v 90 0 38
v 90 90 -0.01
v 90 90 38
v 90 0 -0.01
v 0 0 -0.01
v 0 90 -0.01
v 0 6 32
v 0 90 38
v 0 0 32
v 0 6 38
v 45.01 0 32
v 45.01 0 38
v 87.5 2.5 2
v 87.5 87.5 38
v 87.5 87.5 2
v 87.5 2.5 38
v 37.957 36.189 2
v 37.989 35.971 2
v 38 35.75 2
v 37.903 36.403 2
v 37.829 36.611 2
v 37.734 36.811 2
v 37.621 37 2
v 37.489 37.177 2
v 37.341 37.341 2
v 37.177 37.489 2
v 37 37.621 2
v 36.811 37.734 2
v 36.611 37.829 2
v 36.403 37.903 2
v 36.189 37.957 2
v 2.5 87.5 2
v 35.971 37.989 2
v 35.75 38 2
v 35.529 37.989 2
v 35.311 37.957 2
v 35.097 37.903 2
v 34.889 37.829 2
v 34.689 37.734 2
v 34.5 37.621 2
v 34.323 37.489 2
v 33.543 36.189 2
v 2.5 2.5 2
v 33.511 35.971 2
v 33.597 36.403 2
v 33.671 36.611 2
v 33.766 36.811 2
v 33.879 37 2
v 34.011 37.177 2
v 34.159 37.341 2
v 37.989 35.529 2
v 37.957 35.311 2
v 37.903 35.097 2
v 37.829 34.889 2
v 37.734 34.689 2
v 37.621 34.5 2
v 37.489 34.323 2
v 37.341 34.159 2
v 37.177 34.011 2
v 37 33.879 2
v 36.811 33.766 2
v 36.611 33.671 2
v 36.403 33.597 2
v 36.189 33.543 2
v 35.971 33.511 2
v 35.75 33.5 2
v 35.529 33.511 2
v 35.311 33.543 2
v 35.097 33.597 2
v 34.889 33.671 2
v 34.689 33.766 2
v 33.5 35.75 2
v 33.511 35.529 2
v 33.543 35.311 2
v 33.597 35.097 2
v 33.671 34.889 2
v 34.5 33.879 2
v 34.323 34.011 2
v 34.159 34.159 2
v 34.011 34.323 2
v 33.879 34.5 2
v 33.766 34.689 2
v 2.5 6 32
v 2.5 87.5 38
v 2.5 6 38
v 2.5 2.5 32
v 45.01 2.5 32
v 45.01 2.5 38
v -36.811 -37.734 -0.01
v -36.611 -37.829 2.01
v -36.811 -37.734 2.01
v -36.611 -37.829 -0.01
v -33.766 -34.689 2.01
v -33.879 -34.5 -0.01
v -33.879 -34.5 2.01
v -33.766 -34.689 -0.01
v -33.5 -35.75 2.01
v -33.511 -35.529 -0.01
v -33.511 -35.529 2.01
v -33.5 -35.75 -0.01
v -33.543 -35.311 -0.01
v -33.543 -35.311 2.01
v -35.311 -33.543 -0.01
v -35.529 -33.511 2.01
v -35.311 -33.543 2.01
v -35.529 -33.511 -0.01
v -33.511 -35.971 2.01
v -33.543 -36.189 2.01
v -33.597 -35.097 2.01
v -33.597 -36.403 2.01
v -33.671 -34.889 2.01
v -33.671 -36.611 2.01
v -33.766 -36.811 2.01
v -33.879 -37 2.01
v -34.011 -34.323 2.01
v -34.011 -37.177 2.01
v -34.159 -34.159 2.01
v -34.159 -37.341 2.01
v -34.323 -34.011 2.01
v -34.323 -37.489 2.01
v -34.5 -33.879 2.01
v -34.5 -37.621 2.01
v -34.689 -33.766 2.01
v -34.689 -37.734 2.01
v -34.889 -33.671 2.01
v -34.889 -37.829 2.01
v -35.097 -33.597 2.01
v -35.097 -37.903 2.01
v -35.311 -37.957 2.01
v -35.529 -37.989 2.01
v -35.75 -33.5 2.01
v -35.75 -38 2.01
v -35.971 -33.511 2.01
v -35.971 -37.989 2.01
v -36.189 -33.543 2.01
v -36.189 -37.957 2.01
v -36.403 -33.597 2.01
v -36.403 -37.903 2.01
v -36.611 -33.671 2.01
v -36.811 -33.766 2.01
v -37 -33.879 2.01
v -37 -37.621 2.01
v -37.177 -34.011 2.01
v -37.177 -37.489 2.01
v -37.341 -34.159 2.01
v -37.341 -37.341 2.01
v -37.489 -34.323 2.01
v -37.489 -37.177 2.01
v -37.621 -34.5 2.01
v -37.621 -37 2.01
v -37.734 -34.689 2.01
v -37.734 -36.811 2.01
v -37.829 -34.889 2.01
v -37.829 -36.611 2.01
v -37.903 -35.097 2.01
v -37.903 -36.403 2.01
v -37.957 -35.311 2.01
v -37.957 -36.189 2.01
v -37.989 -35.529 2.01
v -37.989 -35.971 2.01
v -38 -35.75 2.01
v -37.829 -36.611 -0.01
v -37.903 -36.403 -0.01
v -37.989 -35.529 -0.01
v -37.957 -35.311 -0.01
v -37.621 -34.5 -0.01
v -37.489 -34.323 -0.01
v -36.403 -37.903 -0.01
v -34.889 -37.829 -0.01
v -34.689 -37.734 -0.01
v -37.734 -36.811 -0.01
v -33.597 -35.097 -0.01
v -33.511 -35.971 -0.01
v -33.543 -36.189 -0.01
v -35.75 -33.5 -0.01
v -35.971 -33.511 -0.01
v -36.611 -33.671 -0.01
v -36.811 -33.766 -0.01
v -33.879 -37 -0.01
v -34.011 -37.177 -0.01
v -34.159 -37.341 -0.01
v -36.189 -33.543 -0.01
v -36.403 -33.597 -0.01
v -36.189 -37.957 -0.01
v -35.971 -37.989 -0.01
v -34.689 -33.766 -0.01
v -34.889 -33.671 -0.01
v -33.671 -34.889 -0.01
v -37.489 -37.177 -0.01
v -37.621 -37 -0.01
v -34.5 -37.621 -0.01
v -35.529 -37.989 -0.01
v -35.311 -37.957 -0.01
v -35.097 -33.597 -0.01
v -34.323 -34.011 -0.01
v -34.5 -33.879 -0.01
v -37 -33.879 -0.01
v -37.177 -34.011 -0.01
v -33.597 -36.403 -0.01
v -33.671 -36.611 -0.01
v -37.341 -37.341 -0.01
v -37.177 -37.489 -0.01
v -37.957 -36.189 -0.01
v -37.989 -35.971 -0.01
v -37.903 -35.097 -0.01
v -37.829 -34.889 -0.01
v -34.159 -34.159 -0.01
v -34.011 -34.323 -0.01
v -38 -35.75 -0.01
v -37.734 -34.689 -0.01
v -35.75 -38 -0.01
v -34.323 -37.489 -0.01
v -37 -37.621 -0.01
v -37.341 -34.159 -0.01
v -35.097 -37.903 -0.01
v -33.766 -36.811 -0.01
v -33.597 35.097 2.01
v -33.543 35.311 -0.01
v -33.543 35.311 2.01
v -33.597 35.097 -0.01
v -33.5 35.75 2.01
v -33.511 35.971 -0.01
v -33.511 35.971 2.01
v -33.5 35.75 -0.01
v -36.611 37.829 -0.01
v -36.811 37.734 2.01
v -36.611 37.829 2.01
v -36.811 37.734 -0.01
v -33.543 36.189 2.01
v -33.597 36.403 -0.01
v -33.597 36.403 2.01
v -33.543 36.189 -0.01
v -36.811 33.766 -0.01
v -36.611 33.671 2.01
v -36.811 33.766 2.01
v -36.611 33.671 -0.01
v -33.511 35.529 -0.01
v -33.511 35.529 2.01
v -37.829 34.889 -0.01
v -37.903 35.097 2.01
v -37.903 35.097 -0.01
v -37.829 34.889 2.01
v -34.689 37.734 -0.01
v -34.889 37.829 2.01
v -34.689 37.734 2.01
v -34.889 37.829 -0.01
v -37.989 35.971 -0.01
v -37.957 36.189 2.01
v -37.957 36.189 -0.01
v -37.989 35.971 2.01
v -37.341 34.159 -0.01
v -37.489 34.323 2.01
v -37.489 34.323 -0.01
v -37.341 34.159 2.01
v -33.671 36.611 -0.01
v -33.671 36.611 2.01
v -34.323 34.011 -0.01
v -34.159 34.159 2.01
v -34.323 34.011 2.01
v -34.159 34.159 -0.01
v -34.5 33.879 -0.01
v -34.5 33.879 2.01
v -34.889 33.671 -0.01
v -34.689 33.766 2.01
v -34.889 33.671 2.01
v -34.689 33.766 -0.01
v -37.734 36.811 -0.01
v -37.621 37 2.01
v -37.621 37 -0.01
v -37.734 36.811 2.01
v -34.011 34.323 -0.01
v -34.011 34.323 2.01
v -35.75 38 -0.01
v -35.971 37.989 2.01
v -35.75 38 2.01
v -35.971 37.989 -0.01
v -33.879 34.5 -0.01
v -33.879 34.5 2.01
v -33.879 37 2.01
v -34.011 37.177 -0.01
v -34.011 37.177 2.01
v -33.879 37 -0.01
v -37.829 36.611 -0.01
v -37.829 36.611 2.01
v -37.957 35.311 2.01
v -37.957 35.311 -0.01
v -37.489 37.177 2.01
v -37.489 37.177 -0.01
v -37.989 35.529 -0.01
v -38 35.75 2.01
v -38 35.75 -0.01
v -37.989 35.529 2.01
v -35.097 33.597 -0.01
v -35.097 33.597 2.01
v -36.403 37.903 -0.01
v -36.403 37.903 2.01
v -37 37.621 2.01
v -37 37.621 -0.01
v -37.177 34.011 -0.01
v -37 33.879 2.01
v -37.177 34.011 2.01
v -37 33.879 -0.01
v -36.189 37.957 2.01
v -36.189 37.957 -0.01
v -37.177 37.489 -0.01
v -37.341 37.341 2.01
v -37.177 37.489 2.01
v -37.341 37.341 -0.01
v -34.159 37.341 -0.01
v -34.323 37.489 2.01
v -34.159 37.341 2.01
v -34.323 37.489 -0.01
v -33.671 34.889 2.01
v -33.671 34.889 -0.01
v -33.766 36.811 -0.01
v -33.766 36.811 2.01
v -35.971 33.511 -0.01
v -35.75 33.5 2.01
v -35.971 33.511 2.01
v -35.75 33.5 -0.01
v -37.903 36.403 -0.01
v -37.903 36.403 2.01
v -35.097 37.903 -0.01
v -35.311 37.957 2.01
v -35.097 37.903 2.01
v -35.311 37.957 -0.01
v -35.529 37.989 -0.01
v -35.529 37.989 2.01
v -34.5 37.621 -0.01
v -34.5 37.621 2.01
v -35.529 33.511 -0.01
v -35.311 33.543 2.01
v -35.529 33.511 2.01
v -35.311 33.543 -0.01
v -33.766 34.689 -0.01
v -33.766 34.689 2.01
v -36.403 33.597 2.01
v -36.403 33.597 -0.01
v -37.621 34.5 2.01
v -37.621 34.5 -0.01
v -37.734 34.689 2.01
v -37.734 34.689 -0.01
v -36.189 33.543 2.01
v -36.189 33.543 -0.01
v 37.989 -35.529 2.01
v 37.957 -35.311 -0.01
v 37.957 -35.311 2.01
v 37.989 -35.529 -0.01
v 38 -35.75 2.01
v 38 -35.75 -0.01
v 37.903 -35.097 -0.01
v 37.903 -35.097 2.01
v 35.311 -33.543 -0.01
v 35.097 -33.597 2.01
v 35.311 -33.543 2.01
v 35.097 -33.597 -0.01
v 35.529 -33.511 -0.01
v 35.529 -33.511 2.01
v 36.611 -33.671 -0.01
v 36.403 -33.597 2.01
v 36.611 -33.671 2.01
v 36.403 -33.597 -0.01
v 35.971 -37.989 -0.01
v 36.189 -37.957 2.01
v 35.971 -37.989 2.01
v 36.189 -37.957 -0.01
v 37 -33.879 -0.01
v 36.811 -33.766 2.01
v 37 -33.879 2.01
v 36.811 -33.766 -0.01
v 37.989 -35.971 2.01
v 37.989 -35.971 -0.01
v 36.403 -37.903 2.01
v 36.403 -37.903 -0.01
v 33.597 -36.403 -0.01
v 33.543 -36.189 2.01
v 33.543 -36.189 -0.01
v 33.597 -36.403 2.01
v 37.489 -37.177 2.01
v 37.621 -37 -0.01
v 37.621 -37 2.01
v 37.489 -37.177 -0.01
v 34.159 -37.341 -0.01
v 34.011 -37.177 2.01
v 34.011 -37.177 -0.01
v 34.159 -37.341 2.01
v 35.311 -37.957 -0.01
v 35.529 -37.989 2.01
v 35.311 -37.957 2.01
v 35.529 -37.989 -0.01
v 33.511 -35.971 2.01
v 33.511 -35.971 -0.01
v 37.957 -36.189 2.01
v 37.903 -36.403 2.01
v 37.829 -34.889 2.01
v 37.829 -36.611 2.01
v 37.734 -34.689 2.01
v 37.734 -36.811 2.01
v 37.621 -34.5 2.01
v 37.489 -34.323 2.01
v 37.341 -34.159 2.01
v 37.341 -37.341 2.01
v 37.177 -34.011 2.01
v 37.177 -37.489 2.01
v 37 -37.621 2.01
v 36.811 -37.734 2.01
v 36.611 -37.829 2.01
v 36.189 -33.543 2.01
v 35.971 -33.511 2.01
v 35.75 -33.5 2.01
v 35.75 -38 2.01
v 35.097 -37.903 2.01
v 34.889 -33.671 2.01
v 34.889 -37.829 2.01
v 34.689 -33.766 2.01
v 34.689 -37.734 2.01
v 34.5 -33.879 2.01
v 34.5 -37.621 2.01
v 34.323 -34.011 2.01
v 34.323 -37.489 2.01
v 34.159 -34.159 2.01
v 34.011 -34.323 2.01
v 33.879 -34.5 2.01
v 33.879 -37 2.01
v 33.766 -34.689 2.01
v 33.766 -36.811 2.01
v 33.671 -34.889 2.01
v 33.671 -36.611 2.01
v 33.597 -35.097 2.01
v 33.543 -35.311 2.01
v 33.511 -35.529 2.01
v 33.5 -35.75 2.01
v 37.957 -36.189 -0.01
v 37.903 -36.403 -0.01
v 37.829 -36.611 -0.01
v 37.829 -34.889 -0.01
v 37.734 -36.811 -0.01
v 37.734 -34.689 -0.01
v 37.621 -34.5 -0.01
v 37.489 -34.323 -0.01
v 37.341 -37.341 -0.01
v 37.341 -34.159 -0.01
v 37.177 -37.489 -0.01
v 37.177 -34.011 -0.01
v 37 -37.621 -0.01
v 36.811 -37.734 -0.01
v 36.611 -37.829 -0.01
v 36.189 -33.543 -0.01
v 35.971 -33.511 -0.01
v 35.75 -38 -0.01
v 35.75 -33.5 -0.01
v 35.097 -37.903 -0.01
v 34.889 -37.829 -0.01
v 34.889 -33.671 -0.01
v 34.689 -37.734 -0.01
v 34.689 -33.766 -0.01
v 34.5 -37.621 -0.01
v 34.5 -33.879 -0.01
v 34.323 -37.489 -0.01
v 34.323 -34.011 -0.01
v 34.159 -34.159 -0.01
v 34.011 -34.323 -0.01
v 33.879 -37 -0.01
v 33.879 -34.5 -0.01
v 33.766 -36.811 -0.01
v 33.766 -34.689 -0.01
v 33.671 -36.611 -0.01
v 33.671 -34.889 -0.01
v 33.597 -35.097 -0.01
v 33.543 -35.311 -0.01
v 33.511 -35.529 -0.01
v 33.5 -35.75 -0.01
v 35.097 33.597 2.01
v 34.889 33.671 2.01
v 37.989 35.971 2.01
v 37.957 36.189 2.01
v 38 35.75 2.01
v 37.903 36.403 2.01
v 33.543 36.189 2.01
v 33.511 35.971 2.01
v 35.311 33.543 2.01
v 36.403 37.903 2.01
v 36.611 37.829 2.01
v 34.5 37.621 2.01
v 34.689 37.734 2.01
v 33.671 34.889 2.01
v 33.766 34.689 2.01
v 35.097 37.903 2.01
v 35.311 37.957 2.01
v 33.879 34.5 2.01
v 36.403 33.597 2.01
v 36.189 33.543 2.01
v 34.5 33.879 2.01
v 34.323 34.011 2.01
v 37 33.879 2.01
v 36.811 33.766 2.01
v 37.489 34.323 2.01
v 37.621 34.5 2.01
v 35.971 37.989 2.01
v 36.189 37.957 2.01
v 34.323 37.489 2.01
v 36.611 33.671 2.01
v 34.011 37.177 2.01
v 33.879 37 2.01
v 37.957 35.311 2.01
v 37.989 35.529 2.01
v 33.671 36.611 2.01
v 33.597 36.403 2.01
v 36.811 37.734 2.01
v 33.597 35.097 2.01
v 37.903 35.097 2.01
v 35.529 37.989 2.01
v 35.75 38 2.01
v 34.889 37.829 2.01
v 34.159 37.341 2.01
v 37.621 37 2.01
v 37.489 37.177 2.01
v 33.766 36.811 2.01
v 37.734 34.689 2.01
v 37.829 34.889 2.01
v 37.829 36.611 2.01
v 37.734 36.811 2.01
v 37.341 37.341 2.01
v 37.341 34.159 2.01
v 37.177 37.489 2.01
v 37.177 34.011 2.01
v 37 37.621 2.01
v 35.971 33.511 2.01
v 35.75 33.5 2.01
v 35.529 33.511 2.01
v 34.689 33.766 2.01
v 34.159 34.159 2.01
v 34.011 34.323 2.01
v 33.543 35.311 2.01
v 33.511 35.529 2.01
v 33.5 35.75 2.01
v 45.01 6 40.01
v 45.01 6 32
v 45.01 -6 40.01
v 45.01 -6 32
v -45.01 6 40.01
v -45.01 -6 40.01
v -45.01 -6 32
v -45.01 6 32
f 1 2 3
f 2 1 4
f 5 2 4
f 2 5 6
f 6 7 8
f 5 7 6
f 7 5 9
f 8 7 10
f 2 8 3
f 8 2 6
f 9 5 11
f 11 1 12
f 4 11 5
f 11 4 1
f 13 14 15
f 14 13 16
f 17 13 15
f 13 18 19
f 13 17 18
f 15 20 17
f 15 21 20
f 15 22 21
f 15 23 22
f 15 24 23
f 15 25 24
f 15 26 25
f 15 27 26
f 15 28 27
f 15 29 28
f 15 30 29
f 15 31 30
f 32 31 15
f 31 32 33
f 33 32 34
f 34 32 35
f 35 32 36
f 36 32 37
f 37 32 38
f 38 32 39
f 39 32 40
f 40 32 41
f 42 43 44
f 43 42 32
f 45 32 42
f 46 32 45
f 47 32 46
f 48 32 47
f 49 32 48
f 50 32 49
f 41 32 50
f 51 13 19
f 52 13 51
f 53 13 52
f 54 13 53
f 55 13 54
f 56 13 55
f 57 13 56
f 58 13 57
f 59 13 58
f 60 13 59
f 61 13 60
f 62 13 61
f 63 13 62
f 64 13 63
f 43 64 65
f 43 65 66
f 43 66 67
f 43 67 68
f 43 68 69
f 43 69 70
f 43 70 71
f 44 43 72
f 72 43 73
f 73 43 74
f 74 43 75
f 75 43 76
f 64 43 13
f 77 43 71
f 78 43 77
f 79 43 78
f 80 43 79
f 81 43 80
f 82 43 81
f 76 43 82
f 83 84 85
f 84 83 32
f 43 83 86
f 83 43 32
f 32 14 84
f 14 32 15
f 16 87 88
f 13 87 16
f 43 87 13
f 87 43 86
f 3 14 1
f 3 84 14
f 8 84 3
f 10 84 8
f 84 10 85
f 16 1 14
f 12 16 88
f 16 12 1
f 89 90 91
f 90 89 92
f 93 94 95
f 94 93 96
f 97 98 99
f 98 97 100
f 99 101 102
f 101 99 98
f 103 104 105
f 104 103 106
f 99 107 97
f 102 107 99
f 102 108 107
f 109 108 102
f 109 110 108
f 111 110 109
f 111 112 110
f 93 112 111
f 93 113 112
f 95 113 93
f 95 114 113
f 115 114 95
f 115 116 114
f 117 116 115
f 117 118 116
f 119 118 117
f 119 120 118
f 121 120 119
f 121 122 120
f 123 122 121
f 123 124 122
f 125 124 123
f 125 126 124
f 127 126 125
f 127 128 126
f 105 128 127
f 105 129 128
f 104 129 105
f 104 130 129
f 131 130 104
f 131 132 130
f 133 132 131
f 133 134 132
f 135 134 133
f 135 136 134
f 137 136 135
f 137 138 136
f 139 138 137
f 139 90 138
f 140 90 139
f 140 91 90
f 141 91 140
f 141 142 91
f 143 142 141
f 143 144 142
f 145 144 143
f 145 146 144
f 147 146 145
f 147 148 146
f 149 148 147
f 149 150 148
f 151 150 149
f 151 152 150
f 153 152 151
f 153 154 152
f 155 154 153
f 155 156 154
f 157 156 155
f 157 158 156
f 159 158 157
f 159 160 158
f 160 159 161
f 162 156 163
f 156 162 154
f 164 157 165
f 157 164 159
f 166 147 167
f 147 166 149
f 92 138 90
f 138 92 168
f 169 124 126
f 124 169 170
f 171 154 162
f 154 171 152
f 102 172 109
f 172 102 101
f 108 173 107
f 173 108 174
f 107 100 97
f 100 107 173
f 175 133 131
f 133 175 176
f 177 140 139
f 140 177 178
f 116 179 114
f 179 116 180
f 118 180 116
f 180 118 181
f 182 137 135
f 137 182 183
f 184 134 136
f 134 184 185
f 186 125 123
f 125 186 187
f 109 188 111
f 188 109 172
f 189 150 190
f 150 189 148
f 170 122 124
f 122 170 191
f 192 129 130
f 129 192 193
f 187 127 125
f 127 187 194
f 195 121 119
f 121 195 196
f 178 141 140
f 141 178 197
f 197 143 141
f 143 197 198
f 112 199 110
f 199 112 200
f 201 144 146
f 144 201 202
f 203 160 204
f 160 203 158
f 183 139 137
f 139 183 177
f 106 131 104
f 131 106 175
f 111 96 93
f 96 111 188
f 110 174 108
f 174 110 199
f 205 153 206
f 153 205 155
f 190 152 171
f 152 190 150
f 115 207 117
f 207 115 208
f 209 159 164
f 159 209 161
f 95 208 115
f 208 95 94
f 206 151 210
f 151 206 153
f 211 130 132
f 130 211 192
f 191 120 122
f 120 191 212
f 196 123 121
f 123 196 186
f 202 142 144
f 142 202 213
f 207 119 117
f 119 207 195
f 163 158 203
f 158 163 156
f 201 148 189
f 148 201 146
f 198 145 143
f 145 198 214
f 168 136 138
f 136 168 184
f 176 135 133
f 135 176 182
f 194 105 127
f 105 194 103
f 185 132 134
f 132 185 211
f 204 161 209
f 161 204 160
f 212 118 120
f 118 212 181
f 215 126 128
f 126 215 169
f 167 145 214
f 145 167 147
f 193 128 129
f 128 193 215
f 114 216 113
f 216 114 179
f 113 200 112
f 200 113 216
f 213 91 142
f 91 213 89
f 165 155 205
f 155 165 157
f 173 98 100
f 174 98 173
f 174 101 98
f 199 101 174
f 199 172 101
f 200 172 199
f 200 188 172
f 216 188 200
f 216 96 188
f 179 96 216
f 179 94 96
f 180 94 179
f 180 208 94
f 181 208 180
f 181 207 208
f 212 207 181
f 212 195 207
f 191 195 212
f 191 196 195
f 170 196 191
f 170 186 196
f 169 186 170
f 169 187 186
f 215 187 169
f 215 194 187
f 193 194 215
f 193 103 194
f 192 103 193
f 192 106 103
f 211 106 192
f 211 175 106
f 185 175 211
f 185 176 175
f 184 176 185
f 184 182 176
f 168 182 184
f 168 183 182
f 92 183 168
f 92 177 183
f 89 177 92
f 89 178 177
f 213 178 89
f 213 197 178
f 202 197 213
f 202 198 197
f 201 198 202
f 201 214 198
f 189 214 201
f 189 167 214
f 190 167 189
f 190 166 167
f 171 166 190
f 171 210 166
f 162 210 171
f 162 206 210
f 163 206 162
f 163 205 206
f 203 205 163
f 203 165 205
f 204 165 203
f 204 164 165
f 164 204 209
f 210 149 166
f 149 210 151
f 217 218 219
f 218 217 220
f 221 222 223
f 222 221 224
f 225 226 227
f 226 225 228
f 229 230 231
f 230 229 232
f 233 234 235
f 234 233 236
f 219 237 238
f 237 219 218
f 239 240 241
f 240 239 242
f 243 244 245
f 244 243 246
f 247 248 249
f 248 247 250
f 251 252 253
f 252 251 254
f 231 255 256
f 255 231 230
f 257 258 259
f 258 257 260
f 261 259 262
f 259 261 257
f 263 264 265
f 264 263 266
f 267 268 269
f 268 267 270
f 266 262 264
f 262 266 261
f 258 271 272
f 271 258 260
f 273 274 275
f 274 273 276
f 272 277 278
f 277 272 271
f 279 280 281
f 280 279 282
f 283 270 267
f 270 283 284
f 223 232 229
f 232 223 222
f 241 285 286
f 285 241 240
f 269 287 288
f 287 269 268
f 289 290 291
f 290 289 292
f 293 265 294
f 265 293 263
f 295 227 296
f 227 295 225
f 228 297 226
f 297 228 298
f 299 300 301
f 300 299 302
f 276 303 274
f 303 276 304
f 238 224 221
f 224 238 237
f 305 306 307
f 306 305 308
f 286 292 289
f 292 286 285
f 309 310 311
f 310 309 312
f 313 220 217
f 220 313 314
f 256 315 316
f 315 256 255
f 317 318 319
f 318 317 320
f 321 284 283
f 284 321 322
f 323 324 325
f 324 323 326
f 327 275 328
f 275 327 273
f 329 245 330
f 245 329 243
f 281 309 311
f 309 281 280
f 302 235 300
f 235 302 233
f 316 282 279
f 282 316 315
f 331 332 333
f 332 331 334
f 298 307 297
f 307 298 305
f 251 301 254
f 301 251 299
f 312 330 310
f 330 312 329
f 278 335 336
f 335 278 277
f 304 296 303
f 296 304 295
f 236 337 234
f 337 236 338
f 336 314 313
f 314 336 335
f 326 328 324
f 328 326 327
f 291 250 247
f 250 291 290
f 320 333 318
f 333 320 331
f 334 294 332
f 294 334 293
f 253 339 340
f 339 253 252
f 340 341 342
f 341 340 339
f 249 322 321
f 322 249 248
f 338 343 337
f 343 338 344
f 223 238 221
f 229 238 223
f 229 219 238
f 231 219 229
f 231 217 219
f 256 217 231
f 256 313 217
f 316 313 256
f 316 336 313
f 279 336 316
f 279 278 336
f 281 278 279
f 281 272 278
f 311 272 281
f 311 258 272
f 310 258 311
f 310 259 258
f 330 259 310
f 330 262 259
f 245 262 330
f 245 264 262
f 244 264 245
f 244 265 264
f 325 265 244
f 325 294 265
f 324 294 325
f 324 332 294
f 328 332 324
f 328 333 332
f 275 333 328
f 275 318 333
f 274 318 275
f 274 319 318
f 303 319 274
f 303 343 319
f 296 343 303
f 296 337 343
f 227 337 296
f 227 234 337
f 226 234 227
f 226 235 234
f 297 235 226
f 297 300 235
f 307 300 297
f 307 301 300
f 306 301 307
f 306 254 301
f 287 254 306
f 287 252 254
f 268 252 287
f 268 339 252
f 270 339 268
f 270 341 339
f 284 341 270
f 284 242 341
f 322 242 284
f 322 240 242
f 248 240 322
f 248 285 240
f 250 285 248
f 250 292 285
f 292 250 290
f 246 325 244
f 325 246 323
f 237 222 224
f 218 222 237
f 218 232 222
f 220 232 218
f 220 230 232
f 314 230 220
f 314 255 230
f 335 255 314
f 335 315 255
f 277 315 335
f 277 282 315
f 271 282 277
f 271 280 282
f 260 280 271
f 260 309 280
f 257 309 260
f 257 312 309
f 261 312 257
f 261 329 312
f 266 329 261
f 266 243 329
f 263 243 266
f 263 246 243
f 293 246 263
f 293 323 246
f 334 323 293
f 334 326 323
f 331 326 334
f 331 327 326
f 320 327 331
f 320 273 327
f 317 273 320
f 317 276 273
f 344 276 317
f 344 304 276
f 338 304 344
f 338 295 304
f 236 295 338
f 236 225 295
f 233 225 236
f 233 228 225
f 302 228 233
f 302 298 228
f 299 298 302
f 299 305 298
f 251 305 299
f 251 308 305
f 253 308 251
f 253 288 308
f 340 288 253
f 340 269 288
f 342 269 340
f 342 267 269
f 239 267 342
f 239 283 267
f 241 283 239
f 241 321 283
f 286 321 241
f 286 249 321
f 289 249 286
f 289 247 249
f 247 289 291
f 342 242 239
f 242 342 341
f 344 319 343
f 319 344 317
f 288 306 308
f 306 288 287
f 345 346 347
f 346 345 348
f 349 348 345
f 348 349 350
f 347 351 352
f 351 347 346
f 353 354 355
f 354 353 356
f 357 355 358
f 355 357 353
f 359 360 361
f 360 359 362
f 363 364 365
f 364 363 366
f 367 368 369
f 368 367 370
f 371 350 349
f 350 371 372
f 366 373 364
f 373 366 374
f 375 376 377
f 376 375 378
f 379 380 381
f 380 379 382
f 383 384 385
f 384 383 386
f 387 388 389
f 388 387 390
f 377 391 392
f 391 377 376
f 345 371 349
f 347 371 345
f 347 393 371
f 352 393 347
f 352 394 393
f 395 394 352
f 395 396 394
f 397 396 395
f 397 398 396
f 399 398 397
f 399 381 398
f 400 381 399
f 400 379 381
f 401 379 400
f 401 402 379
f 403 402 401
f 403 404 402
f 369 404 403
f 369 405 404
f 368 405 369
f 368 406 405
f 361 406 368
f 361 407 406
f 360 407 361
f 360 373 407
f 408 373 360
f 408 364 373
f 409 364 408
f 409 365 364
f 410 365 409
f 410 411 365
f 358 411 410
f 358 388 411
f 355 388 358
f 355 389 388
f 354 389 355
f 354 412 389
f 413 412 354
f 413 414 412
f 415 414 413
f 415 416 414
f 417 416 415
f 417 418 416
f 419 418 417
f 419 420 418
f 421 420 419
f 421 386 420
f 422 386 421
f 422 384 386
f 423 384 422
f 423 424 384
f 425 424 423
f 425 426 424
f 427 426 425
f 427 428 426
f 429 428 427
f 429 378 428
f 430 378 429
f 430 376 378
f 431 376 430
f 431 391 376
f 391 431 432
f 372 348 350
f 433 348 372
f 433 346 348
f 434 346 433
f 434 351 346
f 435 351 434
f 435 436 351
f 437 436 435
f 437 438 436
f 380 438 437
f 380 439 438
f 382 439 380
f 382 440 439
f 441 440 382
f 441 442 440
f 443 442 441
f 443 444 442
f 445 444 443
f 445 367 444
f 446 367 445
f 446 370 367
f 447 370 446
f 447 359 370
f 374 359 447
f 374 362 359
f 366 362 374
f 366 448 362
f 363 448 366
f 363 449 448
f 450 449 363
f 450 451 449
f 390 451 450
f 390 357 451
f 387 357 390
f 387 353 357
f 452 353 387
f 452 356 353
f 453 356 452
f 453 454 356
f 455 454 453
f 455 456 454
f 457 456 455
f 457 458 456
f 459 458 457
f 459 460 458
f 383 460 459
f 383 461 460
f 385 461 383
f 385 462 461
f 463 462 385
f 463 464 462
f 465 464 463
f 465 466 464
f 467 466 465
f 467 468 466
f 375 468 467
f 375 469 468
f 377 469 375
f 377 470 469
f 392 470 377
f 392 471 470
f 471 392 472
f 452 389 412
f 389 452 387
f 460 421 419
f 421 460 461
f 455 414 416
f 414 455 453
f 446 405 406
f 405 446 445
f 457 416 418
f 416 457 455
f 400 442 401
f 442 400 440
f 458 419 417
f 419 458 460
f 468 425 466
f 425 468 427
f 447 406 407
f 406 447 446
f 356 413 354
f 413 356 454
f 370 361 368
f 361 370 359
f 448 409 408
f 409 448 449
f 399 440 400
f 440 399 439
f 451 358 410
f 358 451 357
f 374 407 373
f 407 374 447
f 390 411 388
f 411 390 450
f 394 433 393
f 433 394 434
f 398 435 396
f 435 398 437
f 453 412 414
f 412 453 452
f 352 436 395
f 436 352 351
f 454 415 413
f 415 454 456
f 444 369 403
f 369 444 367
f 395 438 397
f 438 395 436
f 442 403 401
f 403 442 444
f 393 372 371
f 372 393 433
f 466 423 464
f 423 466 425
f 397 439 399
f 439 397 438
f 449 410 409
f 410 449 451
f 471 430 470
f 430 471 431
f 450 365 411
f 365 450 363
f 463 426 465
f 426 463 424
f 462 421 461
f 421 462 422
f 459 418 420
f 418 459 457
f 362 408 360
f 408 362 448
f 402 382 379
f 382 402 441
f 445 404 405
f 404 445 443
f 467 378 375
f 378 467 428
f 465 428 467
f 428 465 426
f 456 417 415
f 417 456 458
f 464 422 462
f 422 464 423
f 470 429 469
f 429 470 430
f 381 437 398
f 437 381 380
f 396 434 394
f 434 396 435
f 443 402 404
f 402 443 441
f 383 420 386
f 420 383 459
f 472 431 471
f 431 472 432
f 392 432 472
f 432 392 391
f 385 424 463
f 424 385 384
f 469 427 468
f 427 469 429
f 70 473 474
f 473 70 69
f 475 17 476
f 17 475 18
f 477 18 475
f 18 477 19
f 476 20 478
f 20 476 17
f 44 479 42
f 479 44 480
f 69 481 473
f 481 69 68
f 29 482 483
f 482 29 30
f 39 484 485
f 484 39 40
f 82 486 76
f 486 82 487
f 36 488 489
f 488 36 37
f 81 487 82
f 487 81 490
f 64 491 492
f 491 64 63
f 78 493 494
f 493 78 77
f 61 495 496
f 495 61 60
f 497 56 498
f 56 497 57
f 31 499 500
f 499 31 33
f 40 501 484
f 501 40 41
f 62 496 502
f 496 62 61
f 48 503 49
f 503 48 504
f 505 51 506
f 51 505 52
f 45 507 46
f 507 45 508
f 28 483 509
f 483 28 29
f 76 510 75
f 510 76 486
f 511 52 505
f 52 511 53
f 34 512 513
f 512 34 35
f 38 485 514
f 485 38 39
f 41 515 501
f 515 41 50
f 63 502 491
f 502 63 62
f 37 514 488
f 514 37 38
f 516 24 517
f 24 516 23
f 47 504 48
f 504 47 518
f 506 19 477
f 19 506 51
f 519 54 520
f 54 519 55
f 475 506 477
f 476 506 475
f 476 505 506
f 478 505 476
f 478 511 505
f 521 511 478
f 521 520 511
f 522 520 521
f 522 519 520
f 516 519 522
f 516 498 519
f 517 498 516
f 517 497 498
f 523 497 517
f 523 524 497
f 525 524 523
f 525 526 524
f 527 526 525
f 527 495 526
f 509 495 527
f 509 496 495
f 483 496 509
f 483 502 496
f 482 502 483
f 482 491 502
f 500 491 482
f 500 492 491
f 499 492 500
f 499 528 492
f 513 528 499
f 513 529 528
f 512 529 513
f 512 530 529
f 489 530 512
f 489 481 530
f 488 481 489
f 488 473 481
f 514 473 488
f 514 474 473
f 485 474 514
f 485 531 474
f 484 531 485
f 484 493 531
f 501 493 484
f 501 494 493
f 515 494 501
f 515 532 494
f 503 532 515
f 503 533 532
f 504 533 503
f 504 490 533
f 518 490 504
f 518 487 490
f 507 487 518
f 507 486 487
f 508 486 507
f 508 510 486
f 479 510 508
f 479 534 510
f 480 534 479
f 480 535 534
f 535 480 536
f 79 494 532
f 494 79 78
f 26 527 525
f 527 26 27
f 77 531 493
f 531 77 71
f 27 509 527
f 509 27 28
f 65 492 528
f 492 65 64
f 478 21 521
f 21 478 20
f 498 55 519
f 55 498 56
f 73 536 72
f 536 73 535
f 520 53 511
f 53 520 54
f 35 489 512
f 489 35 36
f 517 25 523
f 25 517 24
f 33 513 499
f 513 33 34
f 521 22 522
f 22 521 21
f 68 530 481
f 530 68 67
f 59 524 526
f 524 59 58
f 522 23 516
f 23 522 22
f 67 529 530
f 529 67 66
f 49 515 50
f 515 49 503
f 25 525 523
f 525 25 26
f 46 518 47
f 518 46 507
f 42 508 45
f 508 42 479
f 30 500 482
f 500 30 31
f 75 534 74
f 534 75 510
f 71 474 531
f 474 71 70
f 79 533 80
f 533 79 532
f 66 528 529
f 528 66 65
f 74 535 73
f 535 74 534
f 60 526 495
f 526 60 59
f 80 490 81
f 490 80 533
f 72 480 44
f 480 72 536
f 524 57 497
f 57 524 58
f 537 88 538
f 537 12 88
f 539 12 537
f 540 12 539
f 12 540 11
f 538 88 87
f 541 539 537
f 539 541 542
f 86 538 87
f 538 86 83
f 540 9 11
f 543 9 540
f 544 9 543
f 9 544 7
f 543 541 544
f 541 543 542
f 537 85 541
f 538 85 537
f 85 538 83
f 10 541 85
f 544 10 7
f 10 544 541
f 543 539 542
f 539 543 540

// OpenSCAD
// DIY Magnetic Stirrer Housing
// Dimensions in mm

// Main dimensions
outer_size = 90;
wall_thickness = 2.5;
top_thickness = 2;
height = 40;

// Screw hole pattern
screw_hole_diameter = 4.5;
screw_pattern_size = 71.5;
screw_pattern_offset = screw_pattern_size / 2;

// Cable notch dimensions
notch_width = 12;
notch_depth = 8; // from top (z = height - notch_depth to height)
notch_z_start = height - notch_depth;

// Compute inner dimensions
inner_size = outer_size - 2 * wall_thickness;

// Resolution
$fn = 64;

module stirrer_housing() {
    // Outer shell (box with walls and top)
    difference() {
        // Main outer box
        translate([0, 0, -0.01]) 
            cube([outer_size, outer_size, height + 0.02]);
        
        // Hollow out the interior (walls + top)
        translate([wall_thickness, wall_thickness, top_thickness]) 
            cube([inner_size, inner_size, height - top_thickness + 0.02]);
        
        // Top plate (keep only top layer)
        translate([0, 0, height - top_thickness]) 
            cube([outer_size, outer_size, top_thickness + 0.02]);
        
        // Remove everything above top plate except the top surface
        translate([0, 0, height]) 
            cube([outer_size, outer_size, 0.01]);
    }
    
    // Top plate (re-add as solid)
    translate([0, 0, 0]) 
        cube([outer_size, outer_size, top_thickness]);
    
    // Screw holes in top plate
    for (i = [-1, 1]) {
        for (j = [-1, 1]) {
            translate([
                screw_pattern_offset * i,
                screw_pattern_offset * j,
                -0.01
            ]) {
                cylinder(h = top_thickness + 0.02, r = screw_hole_diameter / 2);
            }
        }
    }
    
    // Cable notch in one wall (front wall, centered in X)
    // Front wall is at Y = -outer_size/2 (negative Y)
    translate([
        -outer_size / 2 - 0.01,  // extend past wall
        -notch_width / 2,
        notch_z_start
    ]) {
        cube([
            outer_size + 0.02,  // full width
            notch_width,
            notch_depth + 0.01
        ]);
    }
}

stirrer_housing();
